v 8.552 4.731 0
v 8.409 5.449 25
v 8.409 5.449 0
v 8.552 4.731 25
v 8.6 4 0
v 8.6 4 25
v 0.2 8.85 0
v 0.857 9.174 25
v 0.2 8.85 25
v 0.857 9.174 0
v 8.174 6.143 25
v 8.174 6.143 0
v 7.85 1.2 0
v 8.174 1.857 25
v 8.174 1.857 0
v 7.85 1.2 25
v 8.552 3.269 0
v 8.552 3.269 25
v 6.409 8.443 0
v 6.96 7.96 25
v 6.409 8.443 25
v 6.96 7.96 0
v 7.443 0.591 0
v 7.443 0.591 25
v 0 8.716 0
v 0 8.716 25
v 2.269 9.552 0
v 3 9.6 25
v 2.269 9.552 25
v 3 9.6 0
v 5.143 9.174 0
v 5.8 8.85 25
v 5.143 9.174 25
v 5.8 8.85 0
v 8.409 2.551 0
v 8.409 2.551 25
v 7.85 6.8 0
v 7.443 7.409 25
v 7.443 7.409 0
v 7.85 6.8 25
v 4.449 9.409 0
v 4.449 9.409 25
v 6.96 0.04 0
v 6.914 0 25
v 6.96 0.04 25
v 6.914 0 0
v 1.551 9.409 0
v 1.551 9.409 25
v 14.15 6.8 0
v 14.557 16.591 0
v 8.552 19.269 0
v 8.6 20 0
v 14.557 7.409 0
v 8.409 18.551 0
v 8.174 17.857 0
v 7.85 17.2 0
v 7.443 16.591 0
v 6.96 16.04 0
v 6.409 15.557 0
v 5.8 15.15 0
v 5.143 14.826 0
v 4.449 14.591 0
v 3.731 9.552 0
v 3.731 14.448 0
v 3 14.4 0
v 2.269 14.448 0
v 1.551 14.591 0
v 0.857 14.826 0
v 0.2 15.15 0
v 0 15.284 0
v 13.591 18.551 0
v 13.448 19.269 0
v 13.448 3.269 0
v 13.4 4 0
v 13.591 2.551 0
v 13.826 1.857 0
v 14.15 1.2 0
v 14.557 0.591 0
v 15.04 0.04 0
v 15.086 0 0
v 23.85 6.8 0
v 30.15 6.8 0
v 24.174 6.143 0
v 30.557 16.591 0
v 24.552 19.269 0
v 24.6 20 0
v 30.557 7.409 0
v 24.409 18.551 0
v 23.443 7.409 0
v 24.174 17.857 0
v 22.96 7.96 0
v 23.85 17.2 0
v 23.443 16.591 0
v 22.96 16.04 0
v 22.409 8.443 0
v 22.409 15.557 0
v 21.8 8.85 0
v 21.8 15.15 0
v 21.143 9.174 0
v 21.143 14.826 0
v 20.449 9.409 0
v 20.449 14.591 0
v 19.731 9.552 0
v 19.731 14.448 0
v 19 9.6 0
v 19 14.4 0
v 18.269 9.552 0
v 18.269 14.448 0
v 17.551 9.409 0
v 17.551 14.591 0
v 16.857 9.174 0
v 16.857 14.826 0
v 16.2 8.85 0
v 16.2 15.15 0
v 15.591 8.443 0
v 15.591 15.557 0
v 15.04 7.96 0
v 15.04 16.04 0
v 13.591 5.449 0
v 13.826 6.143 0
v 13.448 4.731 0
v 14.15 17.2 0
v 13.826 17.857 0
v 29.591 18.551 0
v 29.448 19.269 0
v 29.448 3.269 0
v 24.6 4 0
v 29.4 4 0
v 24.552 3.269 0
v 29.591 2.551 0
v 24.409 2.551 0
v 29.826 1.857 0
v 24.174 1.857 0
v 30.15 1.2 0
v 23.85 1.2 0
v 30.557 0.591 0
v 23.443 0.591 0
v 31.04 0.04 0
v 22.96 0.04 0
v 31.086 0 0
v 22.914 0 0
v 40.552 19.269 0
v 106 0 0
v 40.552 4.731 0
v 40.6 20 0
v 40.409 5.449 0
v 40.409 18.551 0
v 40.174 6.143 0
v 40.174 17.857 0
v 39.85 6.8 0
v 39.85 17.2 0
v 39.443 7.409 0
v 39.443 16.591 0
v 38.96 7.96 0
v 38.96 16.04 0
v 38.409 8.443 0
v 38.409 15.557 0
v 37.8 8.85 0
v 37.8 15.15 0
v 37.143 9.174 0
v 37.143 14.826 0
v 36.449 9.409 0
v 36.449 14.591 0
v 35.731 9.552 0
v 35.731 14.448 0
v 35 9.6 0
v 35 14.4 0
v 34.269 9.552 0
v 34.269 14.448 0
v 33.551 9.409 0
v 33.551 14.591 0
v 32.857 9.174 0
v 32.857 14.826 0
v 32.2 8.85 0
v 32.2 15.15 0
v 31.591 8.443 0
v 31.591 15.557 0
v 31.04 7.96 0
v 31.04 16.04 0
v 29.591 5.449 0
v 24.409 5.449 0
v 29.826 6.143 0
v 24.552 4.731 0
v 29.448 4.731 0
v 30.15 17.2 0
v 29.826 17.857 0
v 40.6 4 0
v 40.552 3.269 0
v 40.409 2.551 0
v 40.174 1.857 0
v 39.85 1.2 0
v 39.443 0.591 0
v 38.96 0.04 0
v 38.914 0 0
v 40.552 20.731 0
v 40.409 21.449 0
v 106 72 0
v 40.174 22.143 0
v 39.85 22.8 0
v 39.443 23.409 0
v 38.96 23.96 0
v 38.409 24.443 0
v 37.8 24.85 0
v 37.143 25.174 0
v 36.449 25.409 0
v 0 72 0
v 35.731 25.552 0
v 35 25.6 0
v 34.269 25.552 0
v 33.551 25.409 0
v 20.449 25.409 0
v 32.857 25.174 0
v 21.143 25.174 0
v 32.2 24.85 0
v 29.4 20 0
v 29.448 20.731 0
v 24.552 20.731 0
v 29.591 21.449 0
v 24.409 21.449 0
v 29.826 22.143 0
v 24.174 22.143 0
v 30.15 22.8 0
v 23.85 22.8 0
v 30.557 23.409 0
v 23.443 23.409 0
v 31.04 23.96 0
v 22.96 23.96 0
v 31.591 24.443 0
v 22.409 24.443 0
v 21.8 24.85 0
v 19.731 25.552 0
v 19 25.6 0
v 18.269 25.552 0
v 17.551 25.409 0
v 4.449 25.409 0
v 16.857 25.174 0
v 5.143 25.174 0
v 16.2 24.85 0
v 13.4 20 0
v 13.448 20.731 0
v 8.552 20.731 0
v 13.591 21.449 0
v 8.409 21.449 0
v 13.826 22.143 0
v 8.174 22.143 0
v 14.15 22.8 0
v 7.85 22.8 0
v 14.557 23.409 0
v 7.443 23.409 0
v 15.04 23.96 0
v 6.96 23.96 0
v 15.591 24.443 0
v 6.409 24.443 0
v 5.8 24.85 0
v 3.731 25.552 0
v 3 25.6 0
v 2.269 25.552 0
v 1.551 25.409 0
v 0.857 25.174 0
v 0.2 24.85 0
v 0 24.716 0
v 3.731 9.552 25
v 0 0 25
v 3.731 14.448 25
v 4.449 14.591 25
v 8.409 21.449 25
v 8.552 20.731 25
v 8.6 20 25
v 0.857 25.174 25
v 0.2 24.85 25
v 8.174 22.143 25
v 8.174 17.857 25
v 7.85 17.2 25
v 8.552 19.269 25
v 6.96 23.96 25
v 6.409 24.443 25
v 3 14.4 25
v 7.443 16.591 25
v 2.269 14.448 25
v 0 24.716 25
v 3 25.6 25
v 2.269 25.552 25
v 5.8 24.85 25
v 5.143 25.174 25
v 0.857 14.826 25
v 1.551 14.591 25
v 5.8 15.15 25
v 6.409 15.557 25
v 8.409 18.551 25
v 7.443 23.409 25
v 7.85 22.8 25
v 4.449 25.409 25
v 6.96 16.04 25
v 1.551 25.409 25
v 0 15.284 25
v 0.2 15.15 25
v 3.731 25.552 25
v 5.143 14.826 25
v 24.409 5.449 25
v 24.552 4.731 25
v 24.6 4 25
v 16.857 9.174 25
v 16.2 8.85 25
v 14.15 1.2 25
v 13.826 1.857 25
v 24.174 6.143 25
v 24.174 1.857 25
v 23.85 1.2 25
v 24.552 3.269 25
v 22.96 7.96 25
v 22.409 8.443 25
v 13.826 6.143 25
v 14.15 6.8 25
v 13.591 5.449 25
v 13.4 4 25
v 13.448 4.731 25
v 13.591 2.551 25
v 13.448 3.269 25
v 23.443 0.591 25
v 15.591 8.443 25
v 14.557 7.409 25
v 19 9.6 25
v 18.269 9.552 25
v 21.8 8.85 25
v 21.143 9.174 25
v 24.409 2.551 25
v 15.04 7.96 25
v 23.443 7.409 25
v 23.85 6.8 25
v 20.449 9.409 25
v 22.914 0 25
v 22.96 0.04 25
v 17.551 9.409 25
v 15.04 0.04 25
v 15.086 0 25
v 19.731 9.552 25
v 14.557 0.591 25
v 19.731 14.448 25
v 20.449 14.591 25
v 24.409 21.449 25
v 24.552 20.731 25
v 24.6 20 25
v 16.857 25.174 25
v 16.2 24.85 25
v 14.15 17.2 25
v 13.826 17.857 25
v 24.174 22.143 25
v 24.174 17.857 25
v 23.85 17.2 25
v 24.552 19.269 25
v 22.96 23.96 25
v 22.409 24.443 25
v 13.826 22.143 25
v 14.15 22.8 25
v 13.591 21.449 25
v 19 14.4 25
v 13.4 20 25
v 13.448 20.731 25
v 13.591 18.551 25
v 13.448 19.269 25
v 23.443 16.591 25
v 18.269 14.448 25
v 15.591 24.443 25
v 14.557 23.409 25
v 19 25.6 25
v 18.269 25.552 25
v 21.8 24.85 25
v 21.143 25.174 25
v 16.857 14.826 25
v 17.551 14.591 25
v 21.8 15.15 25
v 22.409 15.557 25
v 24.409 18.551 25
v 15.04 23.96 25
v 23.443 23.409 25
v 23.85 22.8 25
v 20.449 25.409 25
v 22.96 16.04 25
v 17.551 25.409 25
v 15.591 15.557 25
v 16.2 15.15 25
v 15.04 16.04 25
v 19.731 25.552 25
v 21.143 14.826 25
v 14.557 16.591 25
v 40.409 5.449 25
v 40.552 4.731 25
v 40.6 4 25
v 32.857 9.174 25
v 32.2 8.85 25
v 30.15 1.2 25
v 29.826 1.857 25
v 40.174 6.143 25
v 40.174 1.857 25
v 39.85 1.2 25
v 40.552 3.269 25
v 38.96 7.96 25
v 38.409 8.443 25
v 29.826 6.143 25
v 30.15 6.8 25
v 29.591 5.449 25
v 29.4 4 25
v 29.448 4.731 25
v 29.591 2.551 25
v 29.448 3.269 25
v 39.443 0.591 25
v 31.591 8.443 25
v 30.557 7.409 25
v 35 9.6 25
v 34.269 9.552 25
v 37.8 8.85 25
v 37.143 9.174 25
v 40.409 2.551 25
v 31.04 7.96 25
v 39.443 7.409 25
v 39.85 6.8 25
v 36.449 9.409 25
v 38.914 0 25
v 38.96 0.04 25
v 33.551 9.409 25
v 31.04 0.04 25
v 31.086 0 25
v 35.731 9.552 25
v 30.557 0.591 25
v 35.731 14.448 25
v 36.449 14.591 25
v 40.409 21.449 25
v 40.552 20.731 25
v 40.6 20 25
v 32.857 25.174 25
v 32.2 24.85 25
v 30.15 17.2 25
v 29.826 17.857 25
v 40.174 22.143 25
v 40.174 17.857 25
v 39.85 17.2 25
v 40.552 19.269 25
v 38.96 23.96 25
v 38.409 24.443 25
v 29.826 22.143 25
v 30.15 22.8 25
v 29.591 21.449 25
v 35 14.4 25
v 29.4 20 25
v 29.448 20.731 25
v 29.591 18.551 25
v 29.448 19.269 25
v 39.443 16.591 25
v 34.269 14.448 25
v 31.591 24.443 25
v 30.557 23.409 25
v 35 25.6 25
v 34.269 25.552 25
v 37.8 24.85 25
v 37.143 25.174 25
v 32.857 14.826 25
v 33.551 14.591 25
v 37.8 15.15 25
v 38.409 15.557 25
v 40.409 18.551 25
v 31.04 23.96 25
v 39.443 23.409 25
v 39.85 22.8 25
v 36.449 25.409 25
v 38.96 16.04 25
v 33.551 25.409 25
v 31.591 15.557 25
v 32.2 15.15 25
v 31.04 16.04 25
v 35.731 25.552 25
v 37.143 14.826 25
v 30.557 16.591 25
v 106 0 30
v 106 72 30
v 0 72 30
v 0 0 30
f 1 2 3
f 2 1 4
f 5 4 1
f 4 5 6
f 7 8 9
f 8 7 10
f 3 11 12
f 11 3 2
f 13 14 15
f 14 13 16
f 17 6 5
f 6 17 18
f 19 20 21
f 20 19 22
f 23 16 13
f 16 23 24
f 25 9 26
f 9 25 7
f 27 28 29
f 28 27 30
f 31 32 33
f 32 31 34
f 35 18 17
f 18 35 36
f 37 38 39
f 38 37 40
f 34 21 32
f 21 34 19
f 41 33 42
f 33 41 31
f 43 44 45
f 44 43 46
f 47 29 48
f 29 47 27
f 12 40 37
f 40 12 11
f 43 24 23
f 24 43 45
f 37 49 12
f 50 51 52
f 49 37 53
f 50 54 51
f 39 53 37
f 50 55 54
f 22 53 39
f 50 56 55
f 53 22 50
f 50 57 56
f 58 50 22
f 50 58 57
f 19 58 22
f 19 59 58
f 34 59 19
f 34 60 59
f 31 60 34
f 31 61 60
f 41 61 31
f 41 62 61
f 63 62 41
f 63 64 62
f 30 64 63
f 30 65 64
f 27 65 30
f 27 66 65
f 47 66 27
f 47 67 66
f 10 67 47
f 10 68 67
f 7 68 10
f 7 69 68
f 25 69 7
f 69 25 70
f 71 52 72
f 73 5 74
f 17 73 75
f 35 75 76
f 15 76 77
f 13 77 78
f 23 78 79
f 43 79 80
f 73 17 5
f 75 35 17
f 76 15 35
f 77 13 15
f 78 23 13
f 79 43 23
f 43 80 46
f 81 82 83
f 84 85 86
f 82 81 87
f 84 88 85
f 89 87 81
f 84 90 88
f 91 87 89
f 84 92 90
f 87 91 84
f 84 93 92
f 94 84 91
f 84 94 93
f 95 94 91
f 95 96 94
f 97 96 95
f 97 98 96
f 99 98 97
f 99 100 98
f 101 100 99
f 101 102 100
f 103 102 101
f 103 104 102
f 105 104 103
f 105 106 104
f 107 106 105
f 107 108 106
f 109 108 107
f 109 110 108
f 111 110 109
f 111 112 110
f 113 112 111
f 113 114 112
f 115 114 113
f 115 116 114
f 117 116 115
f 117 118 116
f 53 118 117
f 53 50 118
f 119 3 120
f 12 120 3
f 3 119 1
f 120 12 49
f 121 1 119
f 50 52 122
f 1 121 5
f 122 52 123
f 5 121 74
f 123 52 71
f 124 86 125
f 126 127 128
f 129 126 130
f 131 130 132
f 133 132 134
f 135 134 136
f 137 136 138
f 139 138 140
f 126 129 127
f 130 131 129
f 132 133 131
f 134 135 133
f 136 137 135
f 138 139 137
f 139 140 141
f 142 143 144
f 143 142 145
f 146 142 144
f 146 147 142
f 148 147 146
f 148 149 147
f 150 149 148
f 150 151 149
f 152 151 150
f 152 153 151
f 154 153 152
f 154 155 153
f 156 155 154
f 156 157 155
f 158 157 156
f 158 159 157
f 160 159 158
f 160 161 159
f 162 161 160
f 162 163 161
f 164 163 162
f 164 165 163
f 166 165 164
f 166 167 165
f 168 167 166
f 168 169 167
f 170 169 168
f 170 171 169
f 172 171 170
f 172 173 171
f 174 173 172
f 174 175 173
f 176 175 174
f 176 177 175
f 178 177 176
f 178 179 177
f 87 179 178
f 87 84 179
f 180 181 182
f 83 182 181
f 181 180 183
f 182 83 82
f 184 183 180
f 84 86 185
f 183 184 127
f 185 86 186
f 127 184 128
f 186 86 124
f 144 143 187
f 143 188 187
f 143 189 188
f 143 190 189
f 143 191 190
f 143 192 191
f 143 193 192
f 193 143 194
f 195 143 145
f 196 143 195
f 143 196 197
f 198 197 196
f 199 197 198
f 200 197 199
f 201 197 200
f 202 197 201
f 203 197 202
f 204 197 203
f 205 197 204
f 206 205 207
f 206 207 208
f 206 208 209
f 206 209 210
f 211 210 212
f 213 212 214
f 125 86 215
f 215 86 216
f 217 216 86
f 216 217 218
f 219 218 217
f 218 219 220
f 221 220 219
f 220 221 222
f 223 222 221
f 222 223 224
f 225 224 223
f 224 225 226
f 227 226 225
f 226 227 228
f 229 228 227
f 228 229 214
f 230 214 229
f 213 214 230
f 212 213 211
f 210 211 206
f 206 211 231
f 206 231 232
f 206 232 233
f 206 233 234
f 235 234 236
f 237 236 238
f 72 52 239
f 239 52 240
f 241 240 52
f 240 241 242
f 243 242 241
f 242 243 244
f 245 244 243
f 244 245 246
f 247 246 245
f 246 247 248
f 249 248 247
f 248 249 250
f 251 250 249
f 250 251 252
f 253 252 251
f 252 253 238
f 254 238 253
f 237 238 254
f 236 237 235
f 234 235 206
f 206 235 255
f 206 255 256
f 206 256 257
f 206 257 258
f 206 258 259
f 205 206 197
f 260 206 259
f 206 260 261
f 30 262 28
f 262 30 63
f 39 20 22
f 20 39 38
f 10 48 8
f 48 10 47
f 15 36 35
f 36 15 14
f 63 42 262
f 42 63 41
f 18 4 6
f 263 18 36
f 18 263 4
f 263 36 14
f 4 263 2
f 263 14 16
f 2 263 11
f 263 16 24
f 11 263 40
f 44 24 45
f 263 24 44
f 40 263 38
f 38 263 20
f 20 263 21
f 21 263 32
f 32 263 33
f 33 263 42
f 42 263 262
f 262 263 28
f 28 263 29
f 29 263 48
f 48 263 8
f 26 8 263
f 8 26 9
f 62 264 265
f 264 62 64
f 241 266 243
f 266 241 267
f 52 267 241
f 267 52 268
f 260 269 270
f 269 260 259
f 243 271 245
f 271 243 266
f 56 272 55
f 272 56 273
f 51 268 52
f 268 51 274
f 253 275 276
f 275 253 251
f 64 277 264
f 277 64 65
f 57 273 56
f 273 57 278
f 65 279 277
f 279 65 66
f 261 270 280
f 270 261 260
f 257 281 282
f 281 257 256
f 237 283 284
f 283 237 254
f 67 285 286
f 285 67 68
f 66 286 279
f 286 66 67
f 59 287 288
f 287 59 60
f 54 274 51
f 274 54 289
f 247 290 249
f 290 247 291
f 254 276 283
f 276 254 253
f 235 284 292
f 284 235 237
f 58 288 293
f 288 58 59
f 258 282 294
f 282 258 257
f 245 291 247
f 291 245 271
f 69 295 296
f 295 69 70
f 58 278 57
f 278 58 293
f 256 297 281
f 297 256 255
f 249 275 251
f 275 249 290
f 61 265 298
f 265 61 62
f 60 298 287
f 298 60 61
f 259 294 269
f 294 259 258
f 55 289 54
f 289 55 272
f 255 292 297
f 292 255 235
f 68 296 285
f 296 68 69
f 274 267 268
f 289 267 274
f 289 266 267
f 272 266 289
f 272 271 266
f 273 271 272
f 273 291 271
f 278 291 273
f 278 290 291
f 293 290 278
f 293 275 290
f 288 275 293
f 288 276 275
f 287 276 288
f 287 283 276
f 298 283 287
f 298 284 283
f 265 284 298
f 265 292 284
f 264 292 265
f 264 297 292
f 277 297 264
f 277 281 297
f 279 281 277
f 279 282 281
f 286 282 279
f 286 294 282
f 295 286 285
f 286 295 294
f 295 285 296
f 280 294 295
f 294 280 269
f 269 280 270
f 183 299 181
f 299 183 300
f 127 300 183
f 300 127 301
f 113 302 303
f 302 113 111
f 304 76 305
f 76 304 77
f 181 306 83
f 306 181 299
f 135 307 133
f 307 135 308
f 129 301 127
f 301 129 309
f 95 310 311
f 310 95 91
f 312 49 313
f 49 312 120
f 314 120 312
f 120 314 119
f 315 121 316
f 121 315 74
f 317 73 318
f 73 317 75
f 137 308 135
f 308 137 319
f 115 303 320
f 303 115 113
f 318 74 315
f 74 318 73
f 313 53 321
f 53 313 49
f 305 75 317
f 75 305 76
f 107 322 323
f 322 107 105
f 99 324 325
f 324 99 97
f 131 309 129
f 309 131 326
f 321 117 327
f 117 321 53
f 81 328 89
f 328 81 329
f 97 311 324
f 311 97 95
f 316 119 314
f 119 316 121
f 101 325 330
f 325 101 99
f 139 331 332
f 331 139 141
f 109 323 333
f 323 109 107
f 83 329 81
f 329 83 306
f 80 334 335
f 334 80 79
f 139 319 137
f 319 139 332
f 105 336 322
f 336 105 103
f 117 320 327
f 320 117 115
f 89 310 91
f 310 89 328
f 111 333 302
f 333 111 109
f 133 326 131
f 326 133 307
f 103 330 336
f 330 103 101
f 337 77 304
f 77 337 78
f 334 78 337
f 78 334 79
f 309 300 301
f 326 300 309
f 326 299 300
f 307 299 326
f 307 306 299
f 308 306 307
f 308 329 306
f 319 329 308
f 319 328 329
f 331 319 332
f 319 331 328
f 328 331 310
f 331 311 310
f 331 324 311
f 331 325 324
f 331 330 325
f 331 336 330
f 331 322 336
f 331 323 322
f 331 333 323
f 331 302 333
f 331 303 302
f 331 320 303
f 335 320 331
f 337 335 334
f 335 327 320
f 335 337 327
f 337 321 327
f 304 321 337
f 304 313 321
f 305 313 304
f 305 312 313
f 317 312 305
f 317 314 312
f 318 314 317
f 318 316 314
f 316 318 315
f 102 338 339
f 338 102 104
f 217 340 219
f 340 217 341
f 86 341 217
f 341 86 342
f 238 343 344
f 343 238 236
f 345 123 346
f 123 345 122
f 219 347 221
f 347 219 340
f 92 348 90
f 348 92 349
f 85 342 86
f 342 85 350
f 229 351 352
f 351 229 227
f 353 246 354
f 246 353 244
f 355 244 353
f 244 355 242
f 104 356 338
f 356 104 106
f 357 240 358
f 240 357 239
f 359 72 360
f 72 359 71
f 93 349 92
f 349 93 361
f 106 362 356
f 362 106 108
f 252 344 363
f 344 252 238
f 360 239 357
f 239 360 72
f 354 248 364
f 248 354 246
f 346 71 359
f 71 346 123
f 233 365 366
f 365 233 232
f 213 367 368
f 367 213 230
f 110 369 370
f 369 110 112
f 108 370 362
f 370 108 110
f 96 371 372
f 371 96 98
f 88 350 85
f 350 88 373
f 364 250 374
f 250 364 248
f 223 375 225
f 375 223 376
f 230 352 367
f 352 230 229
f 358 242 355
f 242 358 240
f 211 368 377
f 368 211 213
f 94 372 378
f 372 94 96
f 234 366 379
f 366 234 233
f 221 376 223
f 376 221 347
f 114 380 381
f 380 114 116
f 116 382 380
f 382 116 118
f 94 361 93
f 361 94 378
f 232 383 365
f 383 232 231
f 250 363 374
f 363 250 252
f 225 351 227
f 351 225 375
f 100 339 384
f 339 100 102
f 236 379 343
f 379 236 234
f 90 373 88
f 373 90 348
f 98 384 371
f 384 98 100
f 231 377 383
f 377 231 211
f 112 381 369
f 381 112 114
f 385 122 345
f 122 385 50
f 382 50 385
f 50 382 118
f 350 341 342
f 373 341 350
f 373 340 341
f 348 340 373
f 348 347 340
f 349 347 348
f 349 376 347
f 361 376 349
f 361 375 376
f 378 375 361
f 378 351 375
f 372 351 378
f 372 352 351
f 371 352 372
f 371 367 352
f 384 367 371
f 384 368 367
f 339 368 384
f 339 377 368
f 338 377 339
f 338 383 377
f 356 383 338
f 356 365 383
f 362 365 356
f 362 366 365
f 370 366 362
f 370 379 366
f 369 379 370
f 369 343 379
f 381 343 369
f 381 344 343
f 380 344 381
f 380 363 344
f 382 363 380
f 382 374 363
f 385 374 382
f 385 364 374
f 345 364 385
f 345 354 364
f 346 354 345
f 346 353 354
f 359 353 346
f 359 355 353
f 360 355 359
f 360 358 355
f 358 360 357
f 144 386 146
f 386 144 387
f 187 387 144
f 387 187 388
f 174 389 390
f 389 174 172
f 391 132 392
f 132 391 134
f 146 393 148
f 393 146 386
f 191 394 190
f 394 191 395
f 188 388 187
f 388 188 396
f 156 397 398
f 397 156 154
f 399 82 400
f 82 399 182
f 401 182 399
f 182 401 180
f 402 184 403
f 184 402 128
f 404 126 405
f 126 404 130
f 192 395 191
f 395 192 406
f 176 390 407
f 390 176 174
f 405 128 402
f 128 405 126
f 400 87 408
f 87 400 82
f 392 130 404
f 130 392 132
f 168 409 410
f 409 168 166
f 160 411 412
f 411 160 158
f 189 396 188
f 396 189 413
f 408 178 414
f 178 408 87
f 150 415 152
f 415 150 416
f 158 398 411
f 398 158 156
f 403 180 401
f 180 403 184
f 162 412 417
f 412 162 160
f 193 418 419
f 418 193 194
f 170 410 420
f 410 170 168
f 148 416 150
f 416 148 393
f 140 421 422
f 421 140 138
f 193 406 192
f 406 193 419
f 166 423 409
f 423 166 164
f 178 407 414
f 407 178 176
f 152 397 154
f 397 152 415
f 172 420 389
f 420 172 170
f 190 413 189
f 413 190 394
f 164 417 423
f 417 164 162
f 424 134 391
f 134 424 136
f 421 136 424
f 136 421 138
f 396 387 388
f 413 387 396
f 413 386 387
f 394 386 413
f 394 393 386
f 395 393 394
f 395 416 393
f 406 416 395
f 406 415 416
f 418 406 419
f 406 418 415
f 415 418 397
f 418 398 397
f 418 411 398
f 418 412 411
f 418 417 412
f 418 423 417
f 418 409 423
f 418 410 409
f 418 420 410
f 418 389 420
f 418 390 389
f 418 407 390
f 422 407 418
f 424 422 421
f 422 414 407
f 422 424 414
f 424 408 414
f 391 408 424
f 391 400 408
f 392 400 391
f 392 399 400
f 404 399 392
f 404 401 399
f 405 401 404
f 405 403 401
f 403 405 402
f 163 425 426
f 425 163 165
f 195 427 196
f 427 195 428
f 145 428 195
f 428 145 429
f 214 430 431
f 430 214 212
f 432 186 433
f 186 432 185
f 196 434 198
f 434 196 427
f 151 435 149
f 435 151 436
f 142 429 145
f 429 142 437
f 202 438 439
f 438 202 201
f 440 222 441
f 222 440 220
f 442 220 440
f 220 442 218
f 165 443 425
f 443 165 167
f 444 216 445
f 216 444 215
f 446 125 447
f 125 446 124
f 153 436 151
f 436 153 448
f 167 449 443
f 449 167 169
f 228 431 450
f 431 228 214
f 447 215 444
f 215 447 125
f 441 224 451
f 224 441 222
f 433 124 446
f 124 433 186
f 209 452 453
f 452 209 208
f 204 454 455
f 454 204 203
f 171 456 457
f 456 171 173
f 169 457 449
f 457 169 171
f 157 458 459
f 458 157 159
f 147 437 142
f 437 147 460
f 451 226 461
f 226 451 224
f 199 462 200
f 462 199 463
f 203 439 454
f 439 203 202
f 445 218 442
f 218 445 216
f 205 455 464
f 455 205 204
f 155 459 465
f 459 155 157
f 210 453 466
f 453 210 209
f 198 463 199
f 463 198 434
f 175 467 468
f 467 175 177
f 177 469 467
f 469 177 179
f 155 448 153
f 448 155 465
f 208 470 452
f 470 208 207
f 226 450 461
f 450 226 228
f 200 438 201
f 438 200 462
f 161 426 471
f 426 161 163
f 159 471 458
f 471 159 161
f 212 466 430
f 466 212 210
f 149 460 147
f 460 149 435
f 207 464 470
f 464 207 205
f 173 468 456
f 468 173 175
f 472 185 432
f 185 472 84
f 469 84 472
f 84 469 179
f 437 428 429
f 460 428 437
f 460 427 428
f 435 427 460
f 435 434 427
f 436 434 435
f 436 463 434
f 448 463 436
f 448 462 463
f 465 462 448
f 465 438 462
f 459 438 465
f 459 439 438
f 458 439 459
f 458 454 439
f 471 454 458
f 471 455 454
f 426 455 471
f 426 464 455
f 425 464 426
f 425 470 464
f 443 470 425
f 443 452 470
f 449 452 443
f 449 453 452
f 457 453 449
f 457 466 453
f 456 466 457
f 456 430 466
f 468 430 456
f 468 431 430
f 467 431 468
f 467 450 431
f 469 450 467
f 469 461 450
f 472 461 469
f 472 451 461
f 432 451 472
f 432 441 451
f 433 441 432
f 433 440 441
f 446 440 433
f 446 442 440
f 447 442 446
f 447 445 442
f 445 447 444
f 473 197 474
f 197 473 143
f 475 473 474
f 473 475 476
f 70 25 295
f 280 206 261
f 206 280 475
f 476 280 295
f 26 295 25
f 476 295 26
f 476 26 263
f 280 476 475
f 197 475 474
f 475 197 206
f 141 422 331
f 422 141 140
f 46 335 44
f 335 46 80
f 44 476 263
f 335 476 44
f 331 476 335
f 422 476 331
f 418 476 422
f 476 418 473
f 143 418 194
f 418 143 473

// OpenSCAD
// Bench rack for 1.5 mL microcentrifuge tubes - a solid rectangular block with a regular
// grid of vertical tube holes, open at the top and closed at the bottom (a "floor" below
// the lowest hole). NOVEL general part, parametric in its grid and hole size.
//

L   = 106;
W   = 72;
H   = 30;
rows = 4;
cols = 6;
pX   = 16;
pY   = 16;
d    = 11.2;
depth = 25;

$fn = 48;

floor_z = H - depth;

module tube_hole(x, y) {
    translate([x, y, 0]) cylinder(h = depth, d = d);
}

difference() {
    cube([L, W, H]);
    for (i = [0 : cols - 1], j = [0 : rows - 1])
        translate([-L / 2 + pX / 2 + i * pX, -W / 2 + pY / 2 + j * pY, 0])
            tube_hole(0, 0);
}
